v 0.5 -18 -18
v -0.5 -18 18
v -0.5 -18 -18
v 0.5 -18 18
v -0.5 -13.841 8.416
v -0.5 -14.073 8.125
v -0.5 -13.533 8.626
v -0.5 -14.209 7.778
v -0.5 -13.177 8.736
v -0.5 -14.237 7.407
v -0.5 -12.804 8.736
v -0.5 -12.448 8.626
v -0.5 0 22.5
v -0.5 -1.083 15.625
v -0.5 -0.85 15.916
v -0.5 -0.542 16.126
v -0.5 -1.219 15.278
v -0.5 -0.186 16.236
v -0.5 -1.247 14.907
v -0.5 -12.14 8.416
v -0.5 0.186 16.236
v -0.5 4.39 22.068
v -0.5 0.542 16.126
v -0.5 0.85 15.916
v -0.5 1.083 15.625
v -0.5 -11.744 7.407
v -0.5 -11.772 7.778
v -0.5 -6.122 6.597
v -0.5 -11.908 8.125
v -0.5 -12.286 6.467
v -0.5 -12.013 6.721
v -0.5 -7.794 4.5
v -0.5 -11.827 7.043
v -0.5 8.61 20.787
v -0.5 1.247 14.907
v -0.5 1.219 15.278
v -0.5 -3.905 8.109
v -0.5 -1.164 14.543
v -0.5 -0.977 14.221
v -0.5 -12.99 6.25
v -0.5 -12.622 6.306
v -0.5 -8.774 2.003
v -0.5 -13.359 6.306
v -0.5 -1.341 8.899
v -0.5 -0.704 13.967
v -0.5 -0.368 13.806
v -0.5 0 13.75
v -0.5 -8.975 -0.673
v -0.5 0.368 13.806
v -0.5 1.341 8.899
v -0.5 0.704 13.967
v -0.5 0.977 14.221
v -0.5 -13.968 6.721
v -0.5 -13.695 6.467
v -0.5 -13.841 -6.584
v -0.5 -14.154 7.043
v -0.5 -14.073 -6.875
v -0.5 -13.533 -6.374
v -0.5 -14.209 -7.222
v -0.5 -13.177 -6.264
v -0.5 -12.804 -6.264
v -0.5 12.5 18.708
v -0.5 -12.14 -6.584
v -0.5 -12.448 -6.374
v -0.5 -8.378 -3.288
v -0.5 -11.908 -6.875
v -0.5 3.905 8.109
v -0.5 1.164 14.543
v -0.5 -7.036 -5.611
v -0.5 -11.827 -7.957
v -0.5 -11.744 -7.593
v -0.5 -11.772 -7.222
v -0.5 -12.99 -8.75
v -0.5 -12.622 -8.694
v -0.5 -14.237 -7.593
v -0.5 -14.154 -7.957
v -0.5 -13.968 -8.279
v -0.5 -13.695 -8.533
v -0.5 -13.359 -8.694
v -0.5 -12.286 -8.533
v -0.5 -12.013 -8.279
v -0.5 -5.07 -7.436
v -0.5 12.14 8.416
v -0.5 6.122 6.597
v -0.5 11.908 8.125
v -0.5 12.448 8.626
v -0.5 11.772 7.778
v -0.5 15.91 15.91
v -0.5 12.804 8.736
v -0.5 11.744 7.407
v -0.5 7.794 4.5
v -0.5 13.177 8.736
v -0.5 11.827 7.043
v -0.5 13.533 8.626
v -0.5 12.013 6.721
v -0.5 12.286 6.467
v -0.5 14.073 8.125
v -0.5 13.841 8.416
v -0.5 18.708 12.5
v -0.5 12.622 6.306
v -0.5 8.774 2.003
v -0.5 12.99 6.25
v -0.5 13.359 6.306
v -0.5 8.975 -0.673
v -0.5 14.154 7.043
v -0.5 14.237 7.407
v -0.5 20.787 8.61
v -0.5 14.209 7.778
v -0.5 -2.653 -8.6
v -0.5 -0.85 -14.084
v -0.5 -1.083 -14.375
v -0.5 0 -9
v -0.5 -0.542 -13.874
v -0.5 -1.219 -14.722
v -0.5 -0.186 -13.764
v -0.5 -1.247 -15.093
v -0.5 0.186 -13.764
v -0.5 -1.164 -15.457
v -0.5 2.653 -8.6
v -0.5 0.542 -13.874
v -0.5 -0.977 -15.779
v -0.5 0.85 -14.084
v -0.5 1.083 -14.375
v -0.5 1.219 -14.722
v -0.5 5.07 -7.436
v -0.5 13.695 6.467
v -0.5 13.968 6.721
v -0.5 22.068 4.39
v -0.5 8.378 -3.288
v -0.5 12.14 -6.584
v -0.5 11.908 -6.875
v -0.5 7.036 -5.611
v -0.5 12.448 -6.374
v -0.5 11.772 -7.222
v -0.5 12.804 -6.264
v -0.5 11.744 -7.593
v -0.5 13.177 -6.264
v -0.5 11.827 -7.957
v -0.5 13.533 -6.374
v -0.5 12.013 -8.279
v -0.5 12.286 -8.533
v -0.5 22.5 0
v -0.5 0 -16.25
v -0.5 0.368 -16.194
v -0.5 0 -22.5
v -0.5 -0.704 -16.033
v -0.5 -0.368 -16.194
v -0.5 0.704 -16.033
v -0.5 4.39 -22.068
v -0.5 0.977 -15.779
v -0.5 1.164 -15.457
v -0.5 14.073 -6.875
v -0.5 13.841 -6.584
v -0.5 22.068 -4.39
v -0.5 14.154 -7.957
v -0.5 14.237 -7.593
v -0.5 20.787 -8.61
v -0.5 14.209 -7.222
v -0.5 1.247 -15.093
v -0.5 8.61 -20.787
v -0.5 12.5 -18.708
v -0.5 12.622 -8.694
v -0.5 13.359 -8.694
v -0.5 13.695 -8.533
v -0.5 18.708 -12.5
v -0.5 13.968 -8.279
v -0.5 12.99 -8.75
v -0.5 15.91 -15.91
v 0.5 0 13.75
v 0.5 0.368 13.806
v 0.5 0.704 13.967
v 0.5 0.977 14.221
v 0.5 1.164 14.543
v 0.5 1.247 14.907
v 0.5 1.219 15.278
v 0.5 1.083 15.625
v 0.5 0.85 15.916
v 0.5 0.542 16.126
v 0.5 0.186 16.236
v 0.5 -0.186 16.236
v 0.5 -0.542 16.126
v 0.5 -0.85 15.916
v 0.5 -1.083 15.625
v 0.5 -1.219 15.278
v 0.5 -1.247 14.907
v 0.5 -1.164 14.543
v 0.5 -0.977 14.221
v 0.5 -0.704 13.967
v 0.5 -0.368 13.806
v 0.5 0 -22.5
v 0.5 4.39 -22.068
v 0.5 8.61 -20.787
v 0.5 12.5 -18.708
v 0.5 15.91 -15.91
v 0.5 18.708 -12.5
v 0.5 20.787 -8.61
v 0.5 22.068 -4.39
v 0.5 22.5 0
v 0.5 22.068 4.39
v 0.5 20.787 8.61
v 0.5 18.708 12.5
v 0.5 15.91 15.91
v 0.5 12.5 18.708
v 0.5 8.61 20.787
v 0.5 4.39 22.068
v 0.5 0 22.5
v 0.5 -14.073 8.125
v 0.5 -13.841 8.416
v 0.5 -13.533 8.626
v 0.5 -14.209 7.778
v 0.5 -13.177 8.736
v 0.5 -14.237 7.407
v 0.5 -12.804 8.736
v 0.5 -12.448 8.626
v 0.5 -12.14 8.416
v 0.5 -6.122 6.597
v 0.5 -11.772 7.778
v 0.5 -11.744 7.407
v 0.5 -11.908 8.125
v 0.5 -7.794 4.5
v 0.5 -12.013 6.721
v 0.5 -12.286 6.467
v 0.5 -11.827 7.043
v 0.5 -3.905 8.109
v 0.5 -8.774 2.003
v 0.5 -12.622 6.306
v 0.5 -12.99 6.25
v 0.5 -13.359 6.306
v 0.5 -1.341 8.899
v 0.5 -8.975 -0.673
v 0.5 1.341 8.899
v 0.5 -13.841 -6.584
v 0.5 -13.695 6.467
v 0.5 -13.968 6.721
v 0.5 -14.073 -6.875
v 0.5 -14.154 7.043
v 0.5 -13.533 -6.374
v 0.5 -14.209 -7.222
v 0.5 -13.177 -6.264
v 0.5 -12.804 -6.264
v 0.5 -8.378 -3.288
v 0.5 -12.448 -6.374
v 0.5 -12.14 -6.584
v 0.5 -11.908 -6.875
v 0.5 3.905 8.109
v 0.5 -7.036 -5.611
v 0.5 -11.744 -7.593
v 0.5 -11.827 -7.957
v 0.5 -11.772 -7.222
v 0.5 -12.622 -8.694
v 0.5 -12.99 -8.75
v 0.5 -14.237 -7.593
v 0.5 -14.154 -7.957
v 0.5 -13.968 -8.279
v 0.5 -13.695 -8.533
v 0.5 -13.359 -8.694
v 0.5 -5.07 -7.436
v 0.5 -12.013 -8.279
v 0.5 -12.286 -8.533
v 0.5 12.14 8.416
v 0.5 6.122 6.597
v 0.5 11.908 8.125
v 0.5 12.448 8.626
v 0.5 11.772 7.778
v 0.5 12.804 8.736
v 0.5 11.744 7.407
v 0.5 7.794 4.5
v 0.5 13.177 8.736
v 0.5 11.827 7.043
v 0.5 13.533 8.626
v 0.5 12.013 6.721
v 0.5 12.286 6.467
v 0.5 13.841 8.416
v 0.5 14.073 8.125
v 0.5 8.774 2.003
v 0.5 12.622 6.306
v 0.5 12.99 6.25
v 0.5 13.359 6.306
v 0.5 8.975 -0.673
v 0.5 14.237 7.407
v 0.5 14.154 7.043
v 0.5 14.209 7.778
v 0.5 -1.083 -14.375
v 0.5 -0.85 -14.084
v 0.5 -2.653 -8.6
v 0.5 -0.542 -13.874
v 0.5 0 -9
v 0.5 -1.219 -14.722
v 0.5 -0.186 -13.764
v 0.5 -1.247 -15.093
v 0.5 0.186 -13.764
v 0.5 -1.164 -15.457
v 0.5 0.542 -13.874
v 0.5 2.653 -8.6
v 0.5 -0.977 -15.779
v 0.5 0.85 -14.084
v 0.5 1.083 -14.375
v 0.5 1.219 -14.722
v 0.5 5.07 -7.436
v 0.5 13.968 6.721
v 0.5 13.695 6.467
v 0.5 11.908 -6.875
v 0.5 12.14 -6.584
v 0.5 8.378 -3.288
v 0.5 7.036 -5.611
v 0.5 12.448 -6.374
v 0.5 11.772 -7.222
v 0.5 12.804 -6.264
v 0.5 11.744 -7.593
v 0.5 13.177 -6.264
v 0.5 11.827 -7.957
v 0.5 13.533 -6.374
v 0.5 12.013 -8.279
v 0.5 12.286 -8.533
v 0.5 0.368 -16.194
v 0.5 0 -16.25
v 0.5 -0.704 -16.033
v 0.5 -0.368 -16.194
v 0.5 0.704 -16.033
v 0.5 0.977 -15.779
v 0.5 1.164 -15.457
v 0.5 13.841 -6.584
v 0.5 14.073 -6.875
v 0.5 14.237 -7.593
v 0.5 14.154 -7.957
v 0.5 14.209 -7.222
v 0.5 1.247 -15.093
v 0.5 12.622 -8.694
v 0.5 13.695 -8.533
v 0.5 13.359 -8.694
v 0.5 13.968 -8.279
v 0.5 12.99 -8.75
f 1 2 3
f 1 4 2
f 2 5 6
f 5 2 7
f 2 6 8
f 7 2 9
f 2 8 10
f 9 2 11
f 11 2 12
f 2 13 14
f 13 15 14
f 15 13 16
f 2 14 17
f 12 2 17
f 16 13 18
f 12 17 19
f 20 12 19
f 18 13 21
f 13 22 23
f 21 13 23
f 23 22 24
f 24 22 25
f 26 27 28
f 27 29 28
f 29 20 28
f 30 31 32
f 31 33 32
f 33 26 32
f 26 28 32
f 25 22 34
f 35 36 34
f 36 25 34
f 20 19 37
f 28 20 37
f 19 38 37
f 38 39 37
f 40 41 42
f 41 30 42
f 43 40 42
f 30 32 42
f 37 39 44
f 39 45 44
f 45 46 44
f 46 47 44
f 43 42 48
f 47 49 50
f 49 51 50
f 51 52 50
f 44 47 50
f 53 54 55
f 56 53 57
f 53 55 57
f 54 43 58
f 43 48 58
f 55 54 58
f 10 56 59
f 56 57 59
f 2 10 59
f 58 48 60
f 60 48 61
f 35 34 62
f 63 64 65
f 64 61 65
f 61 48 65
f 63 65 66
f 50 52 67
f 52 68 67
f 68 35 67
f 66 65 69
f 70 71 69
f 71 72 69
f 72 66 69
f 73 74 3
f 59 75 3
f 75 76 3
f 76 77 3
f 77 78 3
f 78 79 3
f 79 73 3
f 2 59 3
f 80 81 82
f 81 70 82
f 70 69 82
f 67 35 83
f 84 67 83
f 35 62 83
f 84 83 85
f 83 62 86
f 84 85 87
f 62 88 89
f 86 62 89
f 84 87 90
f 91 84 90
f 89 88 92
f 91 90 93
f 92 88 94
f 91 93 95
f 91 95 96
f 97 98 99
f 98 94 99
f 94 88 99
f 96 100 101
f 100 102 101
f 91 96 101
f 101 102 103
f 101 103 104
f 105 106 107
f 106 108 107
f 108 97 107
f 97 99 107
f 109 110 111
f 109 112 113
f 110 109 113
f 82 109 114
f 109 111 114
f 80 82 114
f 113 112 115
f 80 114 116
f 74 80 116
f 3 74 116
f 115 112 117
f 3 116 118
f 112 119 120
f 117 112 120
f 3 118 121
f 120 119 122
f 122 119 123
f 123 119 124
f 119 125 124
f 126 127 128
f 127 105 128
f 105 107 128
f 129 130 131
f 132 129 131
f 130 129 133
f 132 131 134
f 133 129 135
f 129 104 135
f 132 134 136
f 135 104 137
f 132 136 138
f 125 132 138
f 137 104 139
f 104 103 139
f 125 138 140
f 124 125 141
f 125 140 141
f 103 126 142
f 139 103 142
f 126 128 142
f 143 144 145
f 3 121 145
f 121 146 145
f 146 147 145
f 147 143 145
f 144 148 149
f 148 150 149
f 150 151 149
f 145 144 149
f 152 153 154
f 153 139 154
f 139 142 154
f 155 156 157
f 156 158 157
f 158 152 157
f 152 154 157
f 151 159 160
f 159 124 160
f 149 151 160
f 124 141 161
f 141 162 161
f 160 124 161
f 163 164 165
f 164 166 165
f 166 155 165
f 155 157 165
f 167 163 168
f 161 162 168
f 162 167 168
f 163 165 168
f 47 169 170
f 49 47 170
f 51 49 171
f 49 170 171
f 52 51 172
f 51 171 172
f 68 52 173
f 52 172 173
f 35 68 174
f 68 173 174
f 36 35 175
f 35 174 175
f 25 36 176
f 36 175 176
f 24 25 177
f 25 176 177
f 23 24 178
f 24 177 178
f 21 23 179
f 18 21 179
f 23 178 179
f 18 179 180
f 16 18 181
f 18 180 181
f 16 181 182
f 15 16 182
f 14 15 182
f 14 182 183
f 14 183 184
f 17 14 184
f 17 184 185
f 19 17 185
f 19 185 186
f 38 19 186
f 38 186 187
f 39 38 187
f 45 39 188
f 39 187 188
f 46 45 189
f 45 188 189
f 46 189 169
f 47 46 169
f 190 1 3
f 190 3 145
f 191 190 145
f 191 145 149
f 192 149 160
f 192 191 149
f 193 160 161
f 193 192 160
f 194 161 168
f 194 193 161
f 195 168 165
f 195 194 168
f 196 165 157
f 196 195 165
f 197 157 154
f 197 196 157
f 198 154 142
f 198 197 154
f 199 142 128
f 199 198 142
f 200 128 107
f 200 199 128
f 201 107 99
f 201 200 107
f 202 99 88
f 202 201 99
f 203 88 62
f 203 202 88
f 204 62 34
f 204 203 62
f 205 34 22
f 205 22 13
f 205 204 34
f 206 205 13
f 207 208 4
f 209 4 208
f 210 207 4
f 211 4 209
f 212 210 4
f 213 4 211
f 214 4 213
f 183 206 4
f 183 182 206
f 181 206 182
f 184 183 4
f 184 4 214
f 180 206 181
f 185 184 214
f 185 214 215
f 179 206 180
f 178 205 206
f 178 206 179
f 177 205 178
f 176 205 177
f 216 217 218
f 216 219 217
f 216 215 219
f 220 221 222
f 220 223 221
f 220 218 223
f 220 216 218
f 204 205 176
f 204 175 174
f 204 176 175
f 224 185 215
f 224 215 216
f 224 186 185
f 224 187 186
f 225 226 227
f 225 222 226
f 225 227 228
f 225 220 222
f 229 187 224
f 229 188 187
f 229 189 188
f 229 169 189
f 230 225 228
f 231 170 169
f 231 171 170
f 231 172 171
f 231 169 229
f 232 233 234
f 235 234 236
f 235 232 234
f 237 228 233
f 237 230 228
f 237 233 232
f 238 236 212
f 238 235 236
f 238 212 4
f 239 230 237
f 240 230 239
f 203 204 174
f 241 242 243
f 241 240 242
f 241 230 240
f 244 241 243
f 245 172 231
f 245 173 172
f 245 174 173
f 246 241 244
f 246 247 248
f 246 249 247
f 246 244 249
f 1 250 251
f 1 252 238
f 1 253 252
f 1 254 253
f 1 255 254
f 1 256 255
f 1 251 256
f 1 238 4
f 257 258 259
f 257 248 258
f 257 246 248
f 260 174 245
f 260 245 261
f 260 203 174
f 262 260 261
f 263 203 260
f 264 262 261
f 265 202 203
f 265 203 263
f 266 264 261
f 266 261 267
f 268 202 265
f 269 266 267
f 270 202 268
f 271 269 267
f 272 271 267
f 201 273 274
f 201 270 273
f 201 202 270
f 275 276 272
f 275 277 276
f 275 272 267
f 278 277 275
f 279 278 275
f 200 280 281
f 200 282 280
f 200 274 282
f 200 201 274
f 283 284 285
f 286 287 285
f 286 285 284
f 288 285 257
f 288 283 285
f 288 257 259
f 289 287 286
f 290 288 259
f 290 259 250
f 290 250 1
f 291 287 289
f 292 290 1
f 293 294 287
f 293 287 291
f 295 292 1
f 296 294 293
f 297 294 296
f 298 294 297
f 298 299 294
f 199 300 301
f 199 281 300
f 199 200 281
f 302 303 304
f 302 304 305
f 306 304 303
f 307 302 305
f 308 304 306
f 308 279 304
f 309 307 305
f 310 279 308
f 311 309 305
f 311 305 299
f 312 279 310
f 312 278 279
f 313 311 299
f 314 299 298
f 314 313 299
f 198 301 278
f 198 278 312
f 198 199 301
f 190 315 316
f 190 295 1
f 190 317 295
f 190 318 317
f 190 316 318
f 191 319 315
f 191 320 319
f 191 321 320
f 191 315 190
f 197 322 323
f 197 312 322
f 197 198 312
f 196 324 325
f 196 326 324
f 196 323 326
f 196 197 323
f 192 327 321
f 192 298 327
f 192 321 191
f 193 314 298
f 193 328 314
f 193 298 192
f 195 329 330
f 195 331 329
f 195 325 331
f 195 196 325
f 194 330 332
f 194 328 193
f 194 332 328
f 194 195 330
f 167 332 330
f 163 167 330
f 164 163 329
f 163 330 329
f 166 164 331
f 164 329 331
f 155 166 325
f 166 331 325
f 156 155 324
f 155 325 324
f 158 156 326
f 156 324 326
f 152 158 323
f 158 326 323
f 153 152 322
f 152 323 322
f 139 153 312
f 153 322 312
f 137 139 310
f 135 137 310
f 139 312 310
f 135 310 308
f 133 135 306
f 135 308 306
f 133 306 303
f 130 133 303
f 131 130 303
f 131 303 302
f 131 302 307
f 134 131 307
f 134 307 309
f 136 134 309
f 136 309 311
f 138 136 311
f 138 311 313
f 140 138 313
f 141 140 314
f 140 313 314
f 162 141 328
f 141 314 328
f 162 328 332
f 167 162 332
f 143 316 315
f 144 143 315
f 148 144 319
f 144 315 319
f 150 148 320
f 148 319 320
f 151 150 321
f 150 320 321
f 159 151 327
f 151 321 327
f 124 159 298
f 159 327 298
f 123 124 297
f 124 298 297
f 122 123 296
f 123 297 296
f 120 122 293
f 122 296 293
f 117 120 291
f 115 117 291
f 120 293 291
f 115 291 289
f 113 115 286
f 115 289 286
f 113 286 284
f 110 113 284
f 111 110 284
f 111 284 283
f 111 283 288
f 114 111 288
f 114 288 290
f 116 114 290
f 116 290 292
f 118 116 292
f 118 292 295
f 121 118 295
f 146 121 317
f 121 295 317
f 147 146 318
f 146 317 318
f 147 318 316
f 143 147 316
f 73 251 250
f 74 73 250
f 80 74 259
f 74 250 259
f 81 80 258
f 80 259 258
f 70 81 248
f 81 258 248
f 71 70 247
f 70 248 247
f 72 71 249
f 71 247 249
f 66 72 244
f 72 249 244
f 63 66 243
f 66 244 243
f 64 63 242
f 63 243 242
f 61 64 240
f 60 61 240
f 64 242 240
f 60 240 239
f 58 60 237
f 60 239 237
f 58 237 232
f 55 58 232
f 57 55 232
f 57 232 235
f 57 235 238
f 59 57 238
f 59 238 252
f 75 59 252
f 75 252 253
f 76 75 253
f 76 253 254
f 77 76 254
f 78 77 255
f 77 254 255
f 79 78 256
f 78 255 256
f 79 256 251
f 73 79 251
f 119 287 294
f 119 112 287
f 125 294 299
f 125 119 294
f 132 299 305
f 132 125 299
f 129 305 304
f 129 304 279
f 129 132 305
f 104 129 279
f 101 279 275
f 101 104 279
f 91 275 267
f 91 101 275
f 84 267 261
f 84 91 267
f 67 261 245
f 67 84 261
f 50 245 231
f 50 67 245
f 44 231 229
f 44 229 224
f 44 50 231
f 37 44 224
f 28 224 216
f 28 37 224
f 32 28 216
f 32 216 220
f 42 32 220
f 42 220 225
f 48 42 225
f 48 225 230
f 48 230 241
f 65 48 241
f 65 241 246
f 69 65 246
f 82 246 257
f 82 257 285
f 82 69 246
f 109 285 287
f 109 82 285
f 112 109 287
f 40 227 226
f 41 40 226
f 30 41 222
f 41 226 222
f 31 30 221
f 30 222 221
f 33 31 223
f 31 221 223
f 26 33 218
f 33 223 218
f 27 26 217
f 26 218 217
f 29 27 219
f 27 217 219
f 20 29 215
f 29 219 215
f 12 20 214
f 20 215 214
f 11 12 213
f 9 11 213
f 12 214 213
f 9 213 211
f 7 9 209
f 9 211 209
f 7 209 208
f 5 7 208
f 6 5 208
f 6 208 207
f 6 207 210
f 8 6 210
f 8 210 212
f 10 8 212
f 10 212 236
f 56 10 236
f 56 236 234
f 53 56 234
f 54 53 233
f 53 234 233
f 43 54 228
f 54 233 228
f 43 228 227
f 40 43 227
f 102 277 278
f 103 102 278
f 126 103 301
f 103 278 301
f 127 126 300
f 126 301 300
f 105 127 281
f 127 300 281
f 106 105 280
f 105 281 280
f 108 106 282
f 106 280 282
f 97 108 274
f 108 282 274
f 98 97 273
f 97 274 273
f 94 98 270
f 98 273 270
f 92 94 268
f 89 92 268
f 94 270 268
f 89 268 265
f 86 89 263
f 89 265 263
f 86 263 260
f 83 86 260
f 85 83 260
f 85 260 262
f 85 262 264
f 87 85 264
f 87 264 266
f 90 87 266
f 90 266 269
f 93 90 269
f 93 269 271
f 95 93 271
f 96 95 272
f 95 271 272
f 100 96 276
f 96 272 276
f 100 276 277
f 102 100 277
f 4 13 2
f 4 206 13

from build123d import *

# Parameters (mm, degrees)
SKETCH1_R           = 9
BOSS_EXTRUDE1_DEPTH = 0.5
SKETCH2_R           = 1.25
CUT_EXTRUDE1_DEPTH  = 1


with BuildPart() as part:
    # Sketch1 → Boss-Extrude1 (new, symmetric)
    with BuildSketch(Plane(origin=(0, 0, 0), x_dir=(0, 0, -1), z_dir=(1, 0, 0))):
        with BuildLine():
            Line((-18, -18), (18, -18))
            Line((18, -18), (22.5, 0))
            ThreePointArc((22.5, 0), (0, 22.5), (-22.5, 0))
            Line((-22.5, 0), (-18, -18))
        make_face()
        Circle(SKETCH1_R, mode=Mode.SUBTRACT)
    extrude(amount=BOSS_EXTRUDE1_DEPTH, both=True)

    # Sketch2 → Cut-Extrude1 (cut)
    with BuildSketch(Plane(origin=(0.5, 0, 0), x_dir=(0, 0, -1), z_dir=(1, 0, 0))):
        with Locations((15, 0)):
            Circle(SKETCH2_R)
        with Locations((7.5, -12.990381057)):
            Circle(SKETCH2_R)
        with Locations((-7.5, -12.990381057)):
            Circle(SKETCH2_R)
        with Locations((-15, 0)):
            Circle(SKETCH2_R)
        with Locations((-7.5, 12.990381057)):
            Circle(SKETCH2_R)
        with Locations((7.5, 12.990381057)):
            Circle(SKETCH2_R)
    extrude(amount=-CUT_EXTRUDE1_DEPTH, mode=Mode.SUBTRACT)


solid = part.part
